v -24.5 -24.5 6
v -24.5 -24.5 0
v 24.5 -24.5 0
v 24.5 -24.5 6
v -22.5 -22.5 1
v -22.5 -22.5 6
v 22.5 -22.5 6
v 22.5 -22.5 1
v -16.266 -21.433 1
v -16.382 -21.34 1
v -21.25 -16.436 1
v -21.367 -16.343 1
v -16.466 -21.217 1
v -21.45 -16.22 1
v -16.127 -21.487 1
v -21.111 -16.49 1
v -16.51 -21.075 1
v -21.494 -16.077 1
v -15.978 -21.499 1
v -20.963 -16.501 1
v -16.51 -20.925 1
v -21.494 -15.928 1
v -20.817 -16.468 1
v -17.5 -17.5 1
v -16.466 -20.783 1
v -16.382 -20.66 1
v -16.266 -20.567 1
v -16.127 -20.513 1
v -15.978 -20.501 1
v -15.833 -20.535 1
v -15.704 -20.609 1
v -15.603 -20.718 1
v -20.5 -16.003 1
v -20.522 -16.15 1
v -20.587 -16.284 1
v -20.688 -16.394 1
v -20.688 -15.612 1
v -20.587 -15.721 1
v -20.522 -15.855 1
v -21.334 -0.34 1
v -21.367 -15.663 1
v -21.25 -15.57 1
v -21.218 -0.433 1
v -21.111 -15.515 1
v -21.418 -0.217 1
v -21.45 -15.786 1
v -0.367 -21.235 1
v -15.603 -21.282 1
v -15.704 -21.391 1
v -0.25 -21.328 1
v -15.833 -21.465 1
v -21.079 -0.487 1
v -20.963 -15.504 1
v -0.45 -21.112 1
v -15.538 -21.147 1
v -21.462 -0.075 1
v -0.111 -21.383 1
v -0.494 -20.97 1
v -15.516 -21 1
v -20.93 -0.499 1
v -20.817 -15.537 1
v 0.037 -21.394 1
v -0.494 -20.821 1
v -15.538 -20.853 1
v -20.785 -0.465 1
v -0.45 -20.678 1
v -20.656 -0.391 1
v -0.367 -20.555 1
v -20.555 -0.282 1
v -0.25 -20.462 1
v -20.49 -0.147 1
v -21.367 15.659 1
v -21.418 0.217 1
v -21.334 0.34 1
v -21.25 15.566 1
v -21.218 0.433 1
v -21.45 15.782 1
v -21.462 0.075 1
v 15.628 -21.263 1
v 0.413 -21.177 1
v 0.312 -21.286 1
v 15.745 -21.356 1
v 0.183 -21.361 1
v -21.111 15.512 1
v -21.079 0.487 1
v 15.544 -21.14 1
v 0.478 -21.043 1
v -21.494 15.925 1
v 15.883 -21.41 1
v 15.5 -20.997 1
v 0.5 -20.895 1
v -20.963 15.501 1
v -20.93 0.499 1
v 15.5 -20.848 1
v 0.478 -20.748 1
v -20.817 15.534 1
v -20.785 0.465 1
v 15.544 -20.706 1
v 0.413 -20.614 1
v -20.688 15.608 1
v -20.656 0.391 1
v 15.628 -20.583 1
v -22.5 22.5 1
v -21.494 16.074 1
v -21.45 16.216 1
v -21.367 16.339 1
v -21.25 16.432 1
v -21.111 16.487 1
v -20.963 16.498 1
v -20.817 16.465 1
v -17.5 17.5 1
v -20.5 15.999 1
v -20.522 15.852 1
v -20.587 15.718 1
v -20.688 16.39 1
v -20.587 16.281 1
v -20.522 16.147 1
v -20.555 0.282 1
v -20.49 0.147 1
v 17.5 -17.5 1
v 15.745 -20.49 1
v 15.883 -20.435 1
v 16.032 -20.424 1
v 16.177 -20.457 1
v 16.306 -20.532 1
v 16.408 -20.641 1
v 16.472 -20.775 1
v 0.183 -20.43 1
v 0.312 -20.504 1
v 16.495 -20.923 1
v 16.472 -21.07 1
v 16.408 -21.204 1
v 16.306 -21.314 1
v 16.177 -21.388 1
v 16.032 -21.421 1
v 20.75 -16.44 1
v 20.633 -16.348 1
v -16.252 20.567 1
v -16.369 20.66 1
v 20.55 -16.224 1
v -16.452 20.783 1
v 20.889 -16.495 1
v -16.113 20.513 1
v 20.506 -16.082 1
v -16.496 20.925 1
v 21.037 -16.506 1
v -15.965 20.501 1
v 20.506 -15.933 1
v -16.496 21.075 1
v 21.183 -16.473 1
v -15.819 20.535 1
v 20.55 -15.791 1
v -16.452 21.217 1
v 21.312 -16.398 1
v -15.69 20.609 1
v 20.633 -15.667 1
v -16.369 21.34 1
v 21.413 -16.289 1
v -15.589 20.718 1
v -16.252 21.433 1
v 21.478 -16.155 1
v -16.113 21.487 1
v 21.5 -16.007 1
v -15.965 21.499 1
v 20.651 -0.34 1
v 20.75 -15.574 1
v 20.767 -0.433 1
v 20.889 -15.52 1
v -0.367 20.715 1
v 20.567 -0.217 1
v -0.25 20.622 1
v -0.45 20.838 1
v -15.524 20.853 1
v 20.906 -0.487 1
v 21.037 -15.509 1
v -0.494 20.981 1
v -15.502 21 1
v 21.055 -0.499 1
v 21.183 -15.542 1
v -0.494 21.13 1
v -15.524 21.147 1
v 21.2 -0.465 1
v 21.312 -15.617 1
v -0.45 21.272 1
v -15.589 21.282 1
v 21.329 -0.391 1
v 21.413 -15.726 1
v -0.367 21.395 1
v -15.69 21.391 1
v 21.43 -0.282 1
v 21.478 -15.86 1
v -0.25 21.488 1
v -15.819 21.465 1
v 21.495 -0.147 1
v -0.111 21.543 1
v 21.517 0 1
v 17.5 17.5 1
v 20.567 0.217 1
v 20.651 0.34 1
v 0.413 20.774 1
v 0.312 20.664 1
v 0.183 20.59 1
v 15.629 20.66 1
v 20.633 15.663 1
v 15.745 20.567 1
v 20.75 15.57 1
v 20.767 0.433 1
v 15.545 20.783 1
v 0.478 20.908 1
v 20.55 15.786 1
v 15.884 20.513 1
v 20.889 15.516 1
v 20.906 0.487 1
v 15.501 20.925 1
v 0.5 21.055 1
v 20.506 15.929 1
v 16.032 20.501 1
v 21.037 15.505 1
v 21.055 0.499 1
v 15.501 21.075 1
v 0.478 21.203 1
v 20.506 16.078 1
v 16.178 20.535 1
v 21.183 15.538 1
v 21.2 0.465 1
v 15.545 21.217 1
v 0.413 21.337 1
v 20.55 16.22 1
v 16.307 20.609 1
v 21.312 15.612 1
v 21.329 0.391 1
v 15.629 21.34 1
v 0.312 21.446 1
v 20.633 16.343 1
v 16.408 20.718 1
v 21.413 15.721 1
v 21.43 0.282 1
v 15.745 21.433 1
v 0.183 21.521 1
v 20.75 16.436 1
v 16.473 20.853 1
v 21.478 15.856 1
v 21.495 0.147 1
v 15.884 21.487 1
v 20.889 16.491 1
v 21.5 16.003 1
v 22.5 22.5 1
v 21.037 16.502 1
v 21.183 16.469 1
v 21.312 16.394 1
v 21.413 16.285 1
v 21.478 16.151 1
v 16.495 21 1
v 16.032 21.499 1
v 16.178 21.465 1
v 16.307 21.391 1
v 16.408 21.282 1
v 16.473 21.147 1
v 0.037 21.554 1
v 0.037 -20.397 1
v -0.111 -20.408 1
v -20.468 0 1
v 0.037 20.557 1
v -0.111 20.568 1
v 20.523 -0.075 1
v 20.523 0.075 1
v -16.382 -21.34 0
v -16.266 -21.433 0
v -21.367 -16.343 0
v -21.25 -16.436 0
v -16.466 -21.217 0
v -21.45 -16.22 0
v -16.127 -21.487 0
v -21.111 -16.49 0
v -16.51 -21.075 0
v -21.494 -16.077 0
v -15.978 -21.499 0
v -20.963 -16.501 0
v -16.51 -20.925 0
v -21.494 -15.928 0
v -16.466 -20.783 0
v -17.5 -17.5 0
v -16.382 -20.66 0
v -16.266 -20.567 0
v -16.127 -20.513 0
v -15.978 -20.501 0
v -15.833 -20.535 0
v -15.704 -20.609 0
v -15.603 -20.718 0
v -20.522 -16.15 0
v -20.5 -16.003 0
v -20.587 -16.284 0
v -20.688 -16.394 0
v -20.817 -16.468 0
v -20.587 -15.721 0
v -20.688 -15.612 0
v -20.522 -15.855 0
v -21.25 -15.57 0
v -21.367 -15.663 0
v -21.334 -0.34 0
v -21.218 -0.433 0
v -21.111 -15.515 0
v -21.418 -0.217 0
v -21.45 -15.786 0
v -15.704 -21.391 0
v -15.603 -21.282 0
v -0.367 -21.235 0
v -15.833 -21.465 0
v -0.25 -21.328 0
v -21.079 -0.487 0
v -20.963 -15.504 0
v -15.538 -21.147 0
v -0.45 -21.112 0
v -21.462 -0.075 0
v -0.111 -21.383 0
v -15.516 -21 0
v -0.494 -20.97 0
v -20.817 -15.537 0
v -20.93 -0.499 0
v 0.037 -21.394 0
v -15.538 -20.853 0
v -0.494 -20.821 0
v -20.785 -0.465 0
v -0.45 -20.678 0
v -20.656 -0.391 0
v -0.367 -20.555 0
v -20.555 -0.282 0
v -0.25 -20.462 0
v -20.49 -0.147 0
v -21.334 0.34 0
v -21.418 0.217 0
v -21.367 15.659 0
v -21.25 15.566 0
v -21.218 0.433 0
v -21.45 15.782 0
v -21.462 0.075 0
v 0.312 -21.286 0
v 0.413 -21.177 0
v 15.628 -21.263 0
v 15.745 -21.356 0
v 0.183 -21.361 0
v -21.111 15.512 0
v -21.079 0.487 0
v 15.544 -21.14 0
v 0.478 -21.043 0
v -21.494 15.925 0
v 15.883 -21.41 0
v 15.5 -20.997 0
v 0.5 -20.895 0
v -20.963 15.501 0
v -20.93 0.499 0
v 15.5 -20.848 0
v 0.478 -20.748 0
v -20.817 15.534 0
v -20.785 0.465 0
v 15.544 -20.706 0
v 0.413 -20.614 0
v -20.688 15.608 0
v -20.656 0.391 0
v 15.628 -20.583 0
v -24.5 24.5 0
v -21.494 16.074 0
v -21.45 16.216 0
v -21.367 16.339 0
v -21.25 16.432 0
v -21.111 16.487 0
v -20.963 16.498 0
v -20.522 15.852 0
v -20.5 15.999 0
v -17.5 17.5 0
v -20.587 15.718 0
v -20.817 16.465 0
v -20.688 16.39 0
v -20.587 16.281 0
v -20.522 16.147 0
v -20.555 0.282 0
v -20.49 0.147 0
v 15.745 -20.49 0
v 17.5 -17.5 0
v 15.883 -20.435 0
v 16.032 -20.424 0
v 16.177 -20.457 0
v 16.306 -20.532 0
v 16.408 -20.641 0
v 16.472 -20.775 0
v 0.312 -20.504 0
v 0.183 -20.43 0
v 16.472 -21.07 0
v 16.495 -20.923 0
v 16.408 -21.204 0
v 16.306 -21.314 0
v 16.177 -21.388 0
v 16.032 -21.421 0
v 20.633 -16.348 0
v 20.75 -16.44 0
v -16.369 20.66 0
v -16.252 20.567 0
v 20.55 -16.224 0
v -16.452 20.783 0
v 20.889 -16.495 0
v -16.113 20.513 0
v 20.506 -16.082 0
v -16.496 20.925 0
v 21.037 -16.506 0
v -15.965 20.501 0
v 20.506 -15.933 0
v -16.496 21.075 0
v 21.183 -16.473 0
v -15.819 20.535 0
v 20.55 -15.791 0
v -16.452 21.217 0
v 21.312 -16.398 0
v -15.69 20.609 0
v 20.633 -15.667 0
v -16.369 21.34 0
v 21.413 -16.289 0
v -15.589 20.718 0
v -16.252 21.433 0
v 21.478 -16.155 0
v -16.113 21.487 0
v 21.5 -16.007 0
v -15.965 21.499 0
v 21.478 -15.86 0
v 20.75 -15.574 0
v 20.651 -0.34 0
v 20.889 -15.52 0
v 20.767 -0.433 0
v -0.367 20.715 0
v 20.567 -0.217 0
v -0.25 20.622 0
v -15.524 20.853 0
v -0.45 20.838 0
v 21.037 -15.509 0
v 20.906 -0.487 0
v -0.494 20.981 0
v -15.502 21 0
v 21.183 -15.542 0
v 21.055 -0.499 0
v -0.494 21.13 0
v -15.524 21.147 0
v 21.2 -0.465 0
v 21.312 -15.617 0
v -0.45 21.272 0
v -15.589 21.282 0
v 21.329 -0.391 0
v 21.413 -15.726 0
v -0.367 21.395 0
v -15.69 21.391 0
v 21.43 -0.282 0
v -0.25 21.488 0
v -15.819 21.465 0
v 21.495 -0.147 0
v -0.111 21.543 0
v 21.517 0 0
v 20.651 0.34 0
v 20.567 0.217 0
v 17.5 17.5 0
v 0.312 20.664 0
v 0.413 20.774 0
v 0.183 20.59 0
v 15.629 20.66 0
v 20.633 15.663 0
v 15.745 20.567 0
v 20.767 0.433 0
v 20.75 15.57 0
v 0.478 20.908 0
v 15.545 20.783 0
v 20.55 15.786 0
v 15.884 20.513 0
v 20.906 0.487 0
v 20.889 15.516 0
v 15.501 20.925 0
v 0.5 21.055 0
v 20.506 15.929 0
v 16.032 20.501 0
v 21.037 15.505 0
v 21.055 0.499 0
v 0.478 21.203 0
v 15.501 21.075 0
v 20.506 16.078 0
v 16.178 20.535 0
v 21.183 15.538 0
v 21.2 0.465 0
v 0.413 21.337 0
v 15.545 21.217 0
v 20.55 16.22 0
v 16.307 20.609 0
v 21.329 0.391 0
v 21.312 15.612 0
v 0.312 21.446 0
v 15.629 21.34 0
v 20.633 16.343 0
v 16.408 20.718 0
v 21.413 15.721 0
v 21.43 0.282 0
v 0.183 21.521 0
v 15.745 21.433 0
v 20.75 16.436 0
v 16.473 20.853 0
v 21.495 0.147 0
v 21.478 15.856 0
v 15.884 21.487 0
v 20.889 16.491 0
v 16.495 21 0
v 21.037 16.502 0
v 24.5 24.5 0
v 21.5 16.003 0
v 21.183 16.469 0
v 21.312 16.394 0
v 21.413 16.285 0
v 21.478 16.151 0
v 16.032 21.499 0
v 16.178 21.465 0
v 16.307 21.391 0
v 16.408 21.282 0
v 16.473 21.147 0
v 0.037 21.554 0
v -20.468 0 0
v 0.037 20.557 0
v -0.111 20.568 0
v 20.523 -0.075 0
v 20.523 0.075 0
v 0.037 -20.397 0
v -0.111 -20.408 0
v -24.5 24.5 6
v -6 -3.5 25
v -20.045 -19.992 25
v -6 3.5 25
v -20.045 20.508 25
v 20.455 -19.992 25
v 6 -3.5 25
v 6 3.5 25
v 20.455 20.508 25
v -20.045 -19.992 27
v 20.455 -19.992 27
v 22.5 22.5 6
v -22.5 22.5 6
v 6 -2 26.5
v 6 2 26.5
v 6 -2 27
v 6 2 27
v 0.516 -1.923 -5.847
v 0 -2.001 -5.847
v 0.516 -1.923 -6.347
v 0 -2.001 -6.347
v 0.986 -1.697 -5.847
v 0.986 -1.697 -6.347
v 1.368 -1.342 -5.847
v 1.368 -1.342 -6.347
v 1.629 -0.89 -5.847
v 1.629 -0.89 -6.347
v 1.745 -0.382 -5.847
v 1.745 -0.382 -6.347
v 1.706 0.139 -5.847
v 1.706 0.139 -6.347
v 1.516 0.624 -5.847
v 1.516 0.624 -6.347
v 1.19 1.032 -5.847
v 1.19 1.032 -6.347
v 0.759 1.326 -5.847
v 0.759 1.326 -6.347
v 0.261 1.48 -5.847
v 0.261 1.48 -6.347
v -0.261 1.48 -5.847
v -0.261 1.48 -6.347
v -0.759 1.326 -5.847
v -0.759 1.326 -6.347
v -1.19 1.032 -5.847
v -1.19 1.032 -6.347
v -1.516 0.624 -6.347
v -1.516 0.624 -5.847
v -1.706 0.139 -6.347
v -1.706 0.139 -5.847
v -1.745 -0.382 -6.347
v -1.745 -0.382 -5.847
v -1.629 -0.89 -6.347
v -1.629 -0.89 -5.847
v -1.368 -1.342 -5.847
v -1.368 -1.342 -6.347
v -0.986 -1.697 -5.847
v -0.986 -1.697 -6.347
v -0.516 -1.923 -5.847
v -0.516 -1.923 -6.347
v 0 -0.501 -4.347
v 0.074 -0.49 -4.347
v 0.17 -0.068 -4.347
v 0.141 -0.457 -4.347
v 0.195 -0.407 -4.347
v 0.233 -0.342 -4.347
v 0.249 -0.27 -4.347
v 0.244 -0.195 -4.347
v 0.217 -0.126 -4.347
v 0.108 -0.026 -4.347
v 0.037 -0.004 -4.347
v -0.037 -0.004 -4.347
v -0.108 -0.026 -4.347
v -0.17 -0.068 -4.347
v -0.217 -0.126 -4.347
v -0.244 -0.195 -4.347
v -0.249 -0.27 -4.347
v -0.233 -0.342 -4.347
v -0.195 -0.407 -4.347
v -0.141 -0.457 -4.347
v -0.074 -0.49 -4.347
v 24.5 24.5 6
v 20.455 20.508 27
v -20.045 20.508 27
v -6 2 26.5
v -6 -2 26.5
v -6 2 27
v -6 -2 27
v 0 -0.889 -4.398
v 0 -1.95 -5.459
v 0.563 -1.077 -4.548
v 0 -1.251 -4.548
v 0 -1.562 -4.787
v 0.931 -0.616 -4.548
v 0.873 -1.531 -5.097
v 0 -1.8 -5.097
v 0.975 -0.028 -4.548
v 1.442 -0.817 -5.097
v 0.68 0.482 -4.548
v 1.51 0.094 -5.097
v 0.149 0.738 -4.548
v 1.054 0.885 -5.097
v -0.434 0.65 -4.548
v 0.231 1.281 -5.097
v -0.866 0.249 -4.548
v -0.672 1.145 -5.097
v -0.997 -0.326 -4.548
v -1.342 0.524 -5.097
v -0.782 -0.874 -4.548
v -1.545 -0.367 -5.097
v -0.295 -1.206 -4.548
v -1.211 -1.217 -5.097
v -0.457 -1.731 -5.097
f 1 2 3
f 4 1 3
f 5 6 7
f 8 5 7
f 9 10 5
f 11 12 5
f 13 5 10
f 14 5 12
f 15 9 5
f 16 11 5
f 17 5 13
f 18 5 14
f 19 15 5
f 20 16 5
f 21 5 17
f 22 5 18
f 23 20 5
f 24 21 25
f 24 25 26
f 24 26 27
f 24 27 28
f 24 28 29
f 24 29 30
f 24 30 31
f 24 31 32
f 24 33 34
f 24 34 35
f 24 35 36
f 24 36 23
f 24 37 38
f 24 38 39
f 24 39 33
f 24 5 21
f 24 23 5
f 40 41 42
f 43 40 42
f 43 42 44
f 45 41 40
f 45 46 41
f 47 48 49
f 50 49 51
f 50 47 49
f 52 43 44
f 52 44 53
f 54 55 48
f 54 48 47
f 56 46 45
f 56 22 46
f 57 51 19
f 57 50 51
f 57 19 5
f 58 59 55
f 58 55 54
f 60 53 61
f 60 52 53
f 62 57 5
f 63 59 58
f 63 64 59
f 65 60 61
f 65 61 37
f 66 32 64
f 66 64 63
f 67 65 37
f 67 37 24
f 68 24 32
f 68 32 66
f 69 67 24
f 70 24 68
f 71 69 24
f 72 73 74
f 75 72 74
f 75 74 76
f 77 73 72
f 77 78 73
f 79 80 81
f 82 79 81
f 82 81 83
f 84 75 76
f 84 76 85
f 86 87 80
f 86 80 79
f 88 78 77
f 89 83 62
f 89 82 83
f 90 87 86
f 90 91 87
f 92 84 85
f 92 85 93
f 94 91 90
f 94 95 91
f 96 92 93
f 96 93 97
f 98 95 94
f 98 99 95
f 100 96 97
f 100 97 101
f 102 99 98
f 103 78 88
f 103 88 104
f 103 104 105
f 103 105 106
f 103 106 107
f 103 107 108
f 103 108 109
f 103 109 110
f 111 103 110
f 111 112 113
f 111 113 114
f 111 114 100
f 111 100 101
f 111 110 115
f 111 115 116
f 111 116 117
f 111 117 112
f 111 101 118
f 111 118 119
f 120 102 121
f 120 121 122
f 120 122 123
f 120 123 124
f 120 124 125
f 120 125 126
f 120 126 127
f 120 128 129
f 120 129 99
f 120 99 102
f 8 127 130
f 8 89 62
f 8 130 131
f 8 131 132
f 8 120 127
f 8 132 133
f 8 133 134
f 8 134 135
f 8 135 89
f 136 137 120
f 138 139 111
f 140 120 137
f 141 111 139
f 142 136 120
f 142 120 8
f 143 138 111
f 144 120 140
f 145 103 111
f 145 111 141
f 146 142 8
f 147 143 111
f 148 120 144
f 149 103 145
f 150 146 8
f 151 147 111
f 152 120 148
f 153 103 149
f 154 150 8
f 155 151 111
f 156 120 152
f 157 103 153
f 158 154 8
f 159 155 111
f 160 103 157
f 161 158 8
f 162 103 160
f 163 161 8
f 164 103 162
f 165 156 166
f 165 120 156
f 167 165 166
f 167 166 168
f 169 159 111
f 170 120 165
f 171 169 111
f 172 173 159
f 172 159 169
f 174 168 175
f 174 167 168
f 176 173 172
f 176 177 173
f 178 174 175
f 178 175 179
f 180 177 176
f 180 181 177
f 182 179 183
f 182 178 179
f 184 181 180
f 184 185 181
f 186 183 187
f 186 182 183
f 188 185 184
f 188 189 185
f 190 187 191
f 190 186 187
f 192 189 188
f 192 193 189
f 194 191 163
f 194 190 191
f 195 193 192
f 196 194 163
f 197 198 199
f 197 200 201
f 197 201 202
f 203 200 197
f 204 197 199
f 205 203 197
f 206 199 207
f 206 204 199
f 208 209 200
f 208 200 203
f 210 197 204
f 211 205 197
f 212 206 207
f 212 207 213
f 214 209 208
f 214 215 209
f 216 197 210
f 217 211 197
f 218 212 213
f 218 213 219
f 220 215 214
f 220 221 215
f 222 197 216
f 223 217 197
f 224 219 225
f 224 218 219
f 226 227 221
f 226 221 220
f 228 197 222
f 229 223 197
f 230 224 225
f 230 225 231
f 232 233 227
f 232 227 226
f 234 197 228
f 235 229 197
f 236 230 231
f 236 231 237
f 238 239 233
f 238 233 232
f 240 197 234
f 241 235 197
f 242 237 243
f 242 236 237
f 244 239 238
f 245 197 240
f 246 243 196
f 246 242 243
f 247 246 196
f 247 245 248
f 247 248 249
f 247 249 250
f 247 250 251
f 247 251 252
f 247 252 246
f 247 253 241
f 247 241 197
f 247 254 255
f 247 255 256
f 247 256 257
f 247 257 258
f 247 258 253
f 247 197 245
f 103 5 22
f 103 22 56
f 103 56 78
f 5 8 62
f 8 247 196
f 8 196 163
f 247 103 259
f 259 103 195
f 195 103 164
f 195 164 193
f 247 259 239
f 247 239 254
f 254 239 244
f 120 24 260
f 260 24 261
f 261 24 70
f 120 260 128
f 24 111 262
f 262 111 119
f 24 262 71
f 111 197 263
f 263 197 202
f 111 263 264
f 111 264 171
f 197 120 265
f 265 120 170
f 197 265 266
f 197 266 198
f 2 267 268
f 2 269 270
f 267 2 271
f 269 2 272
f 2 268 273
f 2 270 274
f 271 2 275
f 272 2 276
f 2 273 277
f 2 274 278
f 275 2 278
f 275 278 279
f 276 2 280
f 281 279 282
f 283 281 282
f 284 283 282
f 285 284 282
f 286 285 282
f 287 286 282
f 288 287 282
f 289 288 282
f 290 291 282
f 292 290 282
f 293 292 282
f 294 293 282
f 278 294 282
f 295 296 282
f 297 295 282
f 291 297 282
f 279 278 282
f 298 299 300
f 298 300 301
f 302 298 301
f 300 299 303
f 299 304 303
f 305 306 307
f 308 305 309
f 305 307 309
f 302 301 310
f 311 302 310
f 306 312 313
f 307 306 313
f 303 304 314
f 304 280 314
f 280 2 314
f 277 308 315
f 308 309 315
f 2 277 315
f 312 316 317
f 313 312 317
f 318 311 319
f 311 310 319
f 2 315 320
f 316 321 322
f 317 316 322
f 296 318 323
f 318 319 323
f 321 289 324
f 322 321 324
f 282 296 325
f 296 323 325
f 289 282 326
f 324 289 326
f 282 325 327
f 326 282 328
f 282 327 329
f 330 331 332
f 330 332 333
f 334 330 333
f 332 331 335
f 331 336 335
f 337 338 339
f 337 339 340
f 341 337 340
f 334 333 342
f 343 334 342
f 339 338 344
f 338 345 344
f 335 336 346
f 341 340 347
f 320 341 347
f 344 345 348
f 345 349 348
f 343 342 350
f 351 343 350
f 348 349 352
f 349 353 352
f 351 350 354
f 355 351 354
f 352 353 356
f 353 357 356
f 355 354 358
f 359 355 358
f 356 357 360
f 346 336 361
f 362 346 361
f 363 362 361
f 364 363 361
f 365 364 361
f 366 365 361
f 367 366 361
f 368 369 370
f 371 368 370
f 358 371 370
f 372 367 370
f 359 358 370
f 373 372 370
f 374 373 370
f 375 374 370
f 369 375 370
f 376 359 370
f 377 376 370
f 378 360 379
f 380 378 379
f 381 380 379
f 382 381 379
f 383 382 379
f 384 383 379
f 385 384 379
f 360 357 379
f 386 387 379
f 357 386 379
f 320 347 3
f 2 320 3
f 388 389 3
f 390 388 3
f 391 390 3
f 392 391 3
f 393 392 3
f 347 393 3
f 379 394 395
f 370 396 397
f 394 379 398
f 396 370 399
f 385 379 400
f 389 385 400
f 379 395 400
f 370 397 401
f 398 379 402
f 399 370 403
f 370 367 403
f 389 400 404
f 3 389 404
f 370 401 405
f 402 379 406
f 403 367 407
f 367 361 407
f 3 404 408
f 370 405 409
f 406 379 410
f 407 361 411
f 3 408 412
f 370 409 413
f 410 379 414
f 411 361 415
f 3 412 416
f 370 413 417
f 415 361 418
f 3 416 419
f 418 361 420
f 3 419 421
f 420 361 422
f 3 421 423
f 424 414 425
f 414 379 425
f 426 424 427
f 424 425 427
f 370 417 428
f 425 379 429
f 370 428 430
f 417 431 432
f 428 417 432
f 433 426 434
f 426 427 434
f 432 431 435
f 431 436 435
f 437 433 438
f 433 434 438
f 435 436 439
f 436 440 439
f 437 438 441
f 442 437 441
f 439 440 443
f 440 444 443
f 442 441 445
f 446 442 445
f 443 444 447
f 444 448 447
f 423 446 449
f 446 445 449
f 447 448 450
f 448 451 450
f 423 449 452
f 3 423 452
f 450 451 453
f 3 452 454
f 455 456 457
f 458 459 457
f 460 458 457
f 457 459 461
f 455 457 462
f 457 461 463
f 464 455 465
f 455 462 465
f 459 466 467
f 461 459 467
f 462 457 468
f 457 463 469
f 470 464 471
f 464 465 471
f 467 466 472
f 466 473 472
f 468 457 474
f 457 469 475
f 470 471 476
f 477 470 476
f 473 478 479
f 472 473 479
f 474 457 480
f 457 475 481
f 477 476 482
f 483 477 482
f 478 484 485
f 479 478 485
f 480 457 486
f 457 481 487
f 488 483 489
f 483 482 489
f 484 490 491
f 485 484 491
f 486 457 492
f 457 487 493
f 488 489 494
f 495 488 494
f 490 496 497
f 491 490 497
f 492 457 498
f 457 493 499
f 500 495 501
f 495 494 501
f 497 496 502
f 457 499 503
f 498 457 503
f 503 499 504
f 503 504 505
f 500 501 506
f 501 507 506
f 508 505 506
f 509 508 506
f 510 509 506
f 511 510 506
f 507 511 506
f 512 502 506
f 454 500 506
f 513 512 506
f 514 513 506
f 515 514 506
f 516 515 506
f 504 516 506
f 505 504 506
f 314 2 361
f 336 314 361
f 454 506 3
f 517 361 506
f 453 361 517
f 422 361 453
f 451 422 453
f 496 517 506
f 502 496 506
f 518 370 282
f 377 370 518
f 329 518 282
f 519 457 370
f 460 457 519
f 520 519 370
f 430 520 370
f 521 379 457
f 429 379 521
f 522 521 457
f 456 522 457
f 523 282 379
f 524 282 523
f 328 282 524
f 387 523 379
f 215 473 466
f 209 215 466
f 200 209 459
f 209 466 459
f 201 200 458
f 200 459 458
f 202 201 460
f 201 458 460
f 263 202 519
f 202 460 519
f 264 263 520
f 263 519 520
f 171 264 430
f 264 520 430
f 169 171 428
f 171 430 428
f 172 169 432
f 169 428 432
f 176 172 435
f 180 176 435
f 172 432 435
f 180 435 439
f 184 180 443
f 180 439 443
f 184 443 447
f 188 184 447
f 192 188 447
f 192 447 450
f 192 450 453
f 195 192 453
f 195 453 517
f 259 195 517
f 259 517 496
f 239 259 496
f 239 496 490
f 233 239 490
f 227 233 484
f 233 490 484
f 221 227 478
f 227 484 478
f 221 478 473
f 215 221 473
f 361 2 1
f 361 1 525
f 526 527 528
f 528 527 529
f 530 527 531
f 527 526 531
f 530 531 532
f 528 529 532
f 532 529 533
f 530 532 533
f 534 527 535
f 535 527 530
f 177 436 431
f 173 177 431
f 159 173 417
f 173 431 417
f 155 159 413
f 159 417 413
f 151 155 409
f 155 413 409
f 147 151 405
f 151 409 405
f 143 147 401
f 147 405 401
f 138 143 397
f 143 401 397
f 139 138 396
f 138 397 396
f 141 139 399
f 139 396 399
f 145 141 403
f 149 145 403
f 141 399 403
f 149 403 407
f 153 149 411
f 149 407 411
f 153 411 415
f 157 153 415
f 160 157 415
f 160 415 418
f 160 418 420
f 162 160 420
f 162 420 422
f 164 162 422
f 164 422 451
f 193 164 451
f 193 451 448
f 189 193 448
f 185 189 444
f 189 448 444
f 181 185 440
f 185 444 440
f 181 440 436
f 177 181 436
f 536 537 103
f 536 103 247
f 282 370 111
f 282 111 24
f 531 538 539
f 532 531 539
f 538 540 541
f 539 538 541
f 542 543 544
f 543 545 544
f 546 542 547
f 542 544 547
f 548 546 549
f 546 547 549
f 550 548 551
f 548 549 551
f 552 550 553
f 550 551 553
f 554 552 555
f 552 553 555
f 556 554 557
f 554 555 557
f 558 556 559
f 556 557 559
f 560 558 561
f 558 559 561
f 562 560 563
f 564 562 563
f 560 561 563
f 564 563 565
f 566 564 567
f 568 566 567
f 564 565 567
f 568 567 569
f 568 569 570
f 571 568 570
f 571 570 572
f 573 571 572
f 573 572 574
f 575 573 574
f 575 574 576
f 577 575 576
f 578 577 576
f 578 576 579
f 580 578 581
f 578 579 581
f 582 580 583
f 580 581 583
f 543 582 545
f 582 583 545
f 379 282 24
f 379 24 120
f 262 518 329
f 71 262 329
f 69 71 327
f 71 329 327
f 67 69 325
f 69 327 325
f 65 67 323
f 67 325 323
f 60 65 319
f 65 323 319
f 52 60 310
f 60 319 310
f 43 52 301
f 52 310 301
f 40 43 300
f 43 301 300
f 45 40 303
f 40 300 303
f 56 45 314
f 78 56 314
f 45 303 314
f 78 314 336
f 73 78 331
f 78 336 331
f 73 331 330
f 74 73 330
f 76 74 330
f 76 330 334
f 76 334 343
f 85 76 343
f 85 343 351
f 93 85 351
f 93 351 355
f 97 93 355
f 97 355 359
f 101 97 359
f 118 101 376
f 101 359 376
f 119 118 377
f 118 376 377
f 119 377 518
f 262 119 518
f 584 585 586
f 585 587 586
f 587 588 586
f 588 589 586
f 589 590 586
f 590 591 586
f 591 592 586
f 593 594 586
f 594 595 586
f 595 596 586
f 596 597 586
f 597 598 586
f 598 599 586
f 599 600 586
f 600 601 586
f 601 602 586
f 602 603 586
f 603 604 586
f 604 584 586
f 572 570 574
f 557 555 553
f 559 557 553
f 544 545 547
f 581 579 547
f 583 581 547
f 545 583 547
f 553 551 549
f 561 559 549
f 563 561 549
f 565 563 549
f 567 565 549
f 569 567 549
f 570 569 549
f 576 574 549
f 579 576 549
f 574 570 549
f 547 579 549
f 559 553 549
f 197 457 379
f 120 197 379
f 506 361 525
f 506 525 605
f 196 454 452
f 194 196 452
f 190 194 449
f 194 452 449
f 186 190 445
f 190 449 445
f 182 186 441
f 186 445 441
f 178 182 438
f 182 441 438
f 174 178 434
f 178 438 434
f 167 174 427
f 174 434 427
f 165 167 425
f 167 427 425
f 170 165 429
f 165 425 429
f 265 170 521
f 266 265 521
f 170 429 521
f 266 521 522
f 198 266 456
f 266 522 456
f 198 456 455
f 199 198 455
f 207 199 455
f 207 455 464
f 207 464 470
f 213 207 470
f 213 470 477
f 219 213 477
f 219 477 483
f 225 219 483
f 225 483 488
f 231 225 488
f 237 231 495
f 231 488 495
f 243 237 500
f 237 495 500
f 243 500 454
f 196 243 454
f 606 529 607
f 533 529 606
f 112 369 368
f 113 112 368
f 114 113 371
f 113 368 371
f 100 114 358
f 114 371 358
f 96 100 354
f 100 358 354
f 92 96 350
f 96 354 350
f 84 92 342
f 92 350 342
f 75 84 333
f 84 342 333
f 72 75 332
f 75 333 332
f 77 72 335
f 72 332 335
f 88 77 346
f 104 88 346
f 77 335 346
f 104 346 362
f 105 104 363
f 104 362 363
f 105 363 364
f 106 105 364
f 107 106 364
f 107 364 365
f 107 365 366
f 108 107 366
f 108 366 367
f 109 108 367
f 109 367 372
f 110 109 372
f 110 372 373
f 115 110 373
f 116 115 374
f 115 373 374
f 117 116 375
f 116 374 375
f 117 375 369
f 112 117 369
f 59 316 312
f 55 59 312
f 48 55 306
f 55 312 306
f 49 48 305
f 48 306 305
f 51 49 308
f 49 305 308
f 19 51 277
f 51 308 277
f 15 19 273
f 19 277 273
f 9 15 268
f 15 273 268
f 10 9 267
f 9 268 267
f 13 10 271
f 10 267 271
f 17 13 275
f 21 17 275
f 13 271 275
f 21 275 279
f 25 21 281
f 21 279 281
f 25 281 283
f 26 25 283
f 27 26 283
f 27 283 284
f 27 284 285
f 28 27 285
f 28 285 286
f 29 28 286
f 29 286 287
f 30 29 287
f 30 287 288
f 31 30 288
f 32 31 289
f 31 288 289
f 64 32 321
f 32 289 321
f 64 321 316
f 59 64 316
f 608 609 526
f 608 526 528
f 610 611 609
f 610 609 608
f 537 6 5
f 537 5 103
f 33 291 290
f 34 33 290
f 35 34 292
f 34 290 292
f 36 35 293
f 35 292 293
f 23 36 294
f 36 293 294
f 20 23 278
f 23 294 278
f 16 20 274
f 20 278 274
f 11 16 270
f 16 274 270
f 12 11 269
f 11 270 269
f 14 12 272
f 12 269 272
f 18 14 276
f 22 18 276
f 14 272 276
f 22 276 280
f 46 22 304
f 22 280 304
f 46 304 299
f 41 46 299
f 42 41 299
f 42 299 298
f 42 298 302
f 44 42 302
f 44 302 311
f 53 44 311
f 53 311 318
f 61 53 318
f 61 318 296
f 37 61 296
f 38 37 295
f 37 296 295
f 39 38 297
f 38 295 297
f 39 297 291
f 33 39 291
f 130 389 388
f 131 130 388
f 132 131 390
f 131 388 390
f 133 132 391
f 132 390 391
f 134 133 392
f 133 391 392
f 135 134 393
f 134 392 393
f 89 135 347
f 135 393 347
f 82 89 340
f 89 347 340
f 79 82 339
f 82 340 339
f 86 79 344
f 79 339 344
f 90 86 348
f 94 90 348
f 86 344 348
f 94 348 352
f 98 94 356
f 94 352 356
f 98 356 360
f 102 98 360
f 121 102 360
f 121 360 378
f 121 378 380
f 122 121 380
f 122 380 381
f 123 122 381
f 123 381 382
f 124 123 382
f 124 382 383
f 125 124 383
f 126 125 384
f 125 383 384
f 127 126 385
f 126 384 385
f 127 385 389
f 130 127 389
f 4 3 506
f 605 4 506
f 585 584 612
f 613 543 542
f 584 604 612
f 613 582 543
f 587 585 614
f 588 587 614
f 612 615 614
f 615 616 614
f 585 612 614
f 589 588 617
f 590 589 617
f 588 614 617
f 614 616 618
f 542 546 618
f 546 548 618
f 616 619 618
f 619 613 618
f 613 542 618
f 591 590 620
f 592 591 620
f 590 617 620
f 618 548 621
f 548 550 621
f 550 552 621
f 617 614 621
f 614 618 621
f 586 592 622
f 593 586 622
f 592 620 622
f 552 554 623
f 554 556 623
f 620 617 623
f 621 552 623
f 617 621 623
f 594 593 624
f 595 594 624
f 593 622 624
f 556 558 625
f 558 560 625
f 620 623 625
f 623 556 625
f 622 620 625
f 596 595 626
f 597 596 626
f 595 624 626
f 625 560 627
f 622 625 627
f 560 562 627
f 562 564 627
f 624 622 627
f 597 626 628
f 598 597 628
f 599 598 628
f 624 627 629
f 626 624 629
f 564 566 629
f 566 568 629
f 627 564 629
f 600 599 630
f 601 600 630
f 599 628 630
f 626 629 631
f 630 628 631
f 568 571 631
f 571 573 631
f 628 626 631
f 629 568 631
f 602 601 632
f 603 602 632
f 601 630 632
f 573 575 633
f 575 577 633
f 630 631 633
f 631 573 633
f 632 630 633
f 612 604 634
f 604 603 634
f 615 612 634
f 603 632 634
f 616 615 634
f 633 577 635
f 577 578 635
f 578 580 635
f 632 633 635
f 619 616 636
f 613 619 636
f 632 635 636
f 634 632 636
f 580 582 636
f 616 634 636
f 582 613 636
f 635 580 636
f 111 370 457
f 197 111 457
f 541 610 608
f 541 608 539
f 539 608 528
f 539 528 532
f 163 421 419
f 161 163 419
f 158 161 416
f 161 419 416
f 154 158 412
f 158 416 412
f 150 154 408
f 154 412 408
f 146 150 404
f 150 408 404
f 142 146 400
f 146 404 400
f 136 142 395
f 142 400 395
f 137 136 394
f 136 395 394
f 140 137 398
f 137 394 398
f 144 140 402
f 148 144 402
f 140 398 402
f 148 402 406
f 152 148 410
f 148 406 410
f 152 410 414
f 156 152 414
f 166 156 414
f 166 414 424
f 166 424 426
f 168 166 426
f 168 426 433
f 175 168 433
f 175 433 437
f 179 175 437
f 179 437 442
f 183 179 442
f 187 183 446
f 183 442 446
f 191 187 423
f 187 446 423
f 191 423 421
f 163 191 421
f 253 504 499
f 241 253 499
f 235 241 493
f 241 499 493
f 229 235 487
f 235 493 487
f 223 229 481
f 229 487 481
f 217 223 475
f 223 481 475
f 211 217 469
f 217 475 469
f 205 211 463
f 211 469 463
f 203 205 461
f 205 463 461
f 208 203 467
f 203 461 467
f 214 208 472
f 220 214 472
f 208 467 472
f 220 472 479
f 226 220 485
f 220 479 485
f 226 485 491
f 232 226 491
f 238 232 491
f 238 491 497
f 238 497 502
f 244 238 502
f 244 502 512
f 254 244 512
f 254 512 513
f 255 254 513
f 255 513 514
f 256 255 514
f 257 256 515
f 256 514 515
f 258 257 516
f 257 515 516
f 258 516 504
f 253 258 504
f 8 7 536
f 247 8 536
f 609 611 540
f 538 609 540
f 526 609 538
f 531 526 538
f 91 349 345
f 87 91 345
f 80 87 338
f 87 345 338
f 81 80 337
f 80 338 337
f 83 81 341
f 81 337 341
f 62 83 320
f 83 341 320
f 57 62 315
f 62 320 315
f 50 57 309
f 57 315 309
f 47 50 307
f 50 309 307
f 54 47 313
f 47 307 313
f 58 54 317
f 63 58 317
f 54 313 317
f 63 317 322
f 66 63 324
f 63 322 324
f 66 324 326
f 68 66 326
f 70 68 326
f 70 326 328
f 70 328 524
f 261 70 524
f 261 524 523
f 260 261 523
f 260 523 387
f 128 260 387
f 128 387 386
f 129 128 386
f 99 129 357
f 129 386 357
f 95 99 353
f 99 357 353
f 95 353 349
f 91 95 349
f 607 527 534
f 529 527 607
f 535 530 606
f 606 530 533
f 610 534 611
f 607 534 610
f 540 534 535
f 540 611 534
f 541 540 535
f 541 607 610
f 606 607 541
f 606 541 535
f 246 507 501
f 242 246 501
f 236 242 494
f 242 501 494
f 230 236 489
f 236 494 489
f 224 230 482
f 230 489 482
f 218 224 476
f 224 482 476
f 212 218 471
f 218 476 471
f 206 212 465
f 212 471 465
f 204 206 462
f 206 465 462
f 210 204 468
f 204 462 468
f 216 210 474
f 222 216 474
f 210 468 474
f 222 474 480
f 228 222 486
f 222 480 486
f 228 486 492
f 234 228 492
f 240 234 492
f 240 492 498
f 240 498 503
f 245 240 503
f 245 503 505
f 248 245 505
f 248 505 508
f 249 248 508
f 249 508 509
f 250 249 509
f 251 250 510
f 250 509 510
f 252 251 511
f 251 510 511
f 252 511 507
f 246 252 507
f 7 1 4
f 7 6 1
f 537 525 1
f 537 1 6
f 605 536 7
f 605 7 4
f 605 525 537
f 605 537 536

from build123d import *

# Parameters (mm, degrees)
F0_W      = 49
F0_H      = 49
F1_DEPTH  = 6
F2_W      = 45
F2_H      = 45
F3_DEPTH  = 5
F4_W      = 35
F4_H      = 35
F5_DEPTH  = 6.001
F10_W     = 40.5
F10_H     = 40.5
F11_DEPTH = 2
F12_W     = 12
F12_H     = 4
F13_DEPTH = 33.3483119268
F14_SIZE  = 1.5
F15_R     = 0.5
F16_DEPTH = 1


# Not quite as in the source:
# - a feature of the source that left no trace in its solid (it failed there, or was rolled back) is left out


with BuildPart() as f1:
    # F0 (on Top) → F1 (new body)
    with BuildSketch(Plane.XY):
        Rectangle(F0_W, F0_H)
    extrude(amount=F1_DEPTH)

    # F2 (on face) → F3 (cut)
    with BuildSketch(Plane.XY.offset(6)):
        Rectangle(F2_W, F2_H)
    extrude(amount=-F3_DEPTH, mode=Mode.SUBTRACT)

    # F4 (on face) → F5 (cut, through all)
    with BuildSketch(Plane(origin=(0, 0, 0), x_dir=(1, 0, 0), z_dir=(0, 0, -1))):
        Rectangle(F4_W, F4_H)
    extrude(amount=-F5_DEPTH, mode=Mode.SUBTRACT)

    # F15 (on face) → F16 (cut)
    with BuildSketch(Plane(origin=(0, 0, 0), x_dir=(1, 0, 0), z_dir=(0, 0, -1))):
        with Locations((0, 20.8953134716)):
            Circle(F15_R)
        with Locations((-20.9677405655, 0)):
            Circle(F15_R)
        with Locations((0, -21.0554059595)):
            Circle(F15_R)
        with Locations((21.0171975195, 0)):
            Circle(F15_R)
        with Locations((21, 16.0074820742)):
            Circle(F15_R)
        with Locations((15.9945003688, 20.9227129817)):
            Circle(F15_R)
        with Locations((-16.0156711936, 21)):
            Circle(F15_R)
        with Locations((-21, 16.0026811063)):
            Circle(F15_R)
        with Locations((-21, -15.9993395209)):
            Circle(F15_R)
        with Locations((-16.001984477, -21)):
            Circle(F15_R)
        with Locations((15.9951094538, -21)):
            Circle(F15_R)
        with Locations((21, -16.0031374544)):
            Circle(F15_R)
    extrude(amount=-F16_DEPTH, mode=Mode.SUBTRACT)


with BuildPart() as f8:
    # F7 (on Right) → F8 (revolve)
    with BuildSketch(Plane.YZ):
        with BuildLine():
            Line((-2.0008900769, -5.8473119268), (-2.0008900769, -6.3473119268))
            Line((-2.0008900769, -6.3473119268), (-0.2508900769, -6.3473119268))
            Line((-0.2508900769, -6.3473119268), (-0.2508900769, -4.3473119268))
            Line((-0.2508900769, -4.3473119268), (-0.5008900769, -4.3473119268))
            ThreePointArc((-0.5008900769, -4.3473119268), (-1.5615502487, -4.786651755), (-2.0008900769, -5.8473119268))
        make_face()
    revolve(axis=Axis((0, -0.2508900769, -5.3473119268), (0, 0, 1)))


with BuildPart() as f11:
    # F10 (on offset) → F11 (new body)
    with BuildSketch(Plane.XY.offset(25)):
        with Locations((0.2051311374, 0.2580289319)):
            Rectangle(F10_W, F10_H)
    extrude(amount=F11_DEPTH)

    # F12 (on face) → F13 (cut, through all)
    with BuildSketch(Plane.XY.offset(27)):
        Rectangle(F12_W, F12_H)
    extrude(amount=-F13_DEPTH, mode=Mode.SUBTRACT)

    # F14
    f14_edges = [f11.edges().sort_by_distance(p)[0] for p in [
        (0, -2, 25),
        (0, 2, 25),
    ]]
    chamfer(f14_edges, length=F14_SIZE)


solid = Compound([f1.part, f8.part, f11.part])
